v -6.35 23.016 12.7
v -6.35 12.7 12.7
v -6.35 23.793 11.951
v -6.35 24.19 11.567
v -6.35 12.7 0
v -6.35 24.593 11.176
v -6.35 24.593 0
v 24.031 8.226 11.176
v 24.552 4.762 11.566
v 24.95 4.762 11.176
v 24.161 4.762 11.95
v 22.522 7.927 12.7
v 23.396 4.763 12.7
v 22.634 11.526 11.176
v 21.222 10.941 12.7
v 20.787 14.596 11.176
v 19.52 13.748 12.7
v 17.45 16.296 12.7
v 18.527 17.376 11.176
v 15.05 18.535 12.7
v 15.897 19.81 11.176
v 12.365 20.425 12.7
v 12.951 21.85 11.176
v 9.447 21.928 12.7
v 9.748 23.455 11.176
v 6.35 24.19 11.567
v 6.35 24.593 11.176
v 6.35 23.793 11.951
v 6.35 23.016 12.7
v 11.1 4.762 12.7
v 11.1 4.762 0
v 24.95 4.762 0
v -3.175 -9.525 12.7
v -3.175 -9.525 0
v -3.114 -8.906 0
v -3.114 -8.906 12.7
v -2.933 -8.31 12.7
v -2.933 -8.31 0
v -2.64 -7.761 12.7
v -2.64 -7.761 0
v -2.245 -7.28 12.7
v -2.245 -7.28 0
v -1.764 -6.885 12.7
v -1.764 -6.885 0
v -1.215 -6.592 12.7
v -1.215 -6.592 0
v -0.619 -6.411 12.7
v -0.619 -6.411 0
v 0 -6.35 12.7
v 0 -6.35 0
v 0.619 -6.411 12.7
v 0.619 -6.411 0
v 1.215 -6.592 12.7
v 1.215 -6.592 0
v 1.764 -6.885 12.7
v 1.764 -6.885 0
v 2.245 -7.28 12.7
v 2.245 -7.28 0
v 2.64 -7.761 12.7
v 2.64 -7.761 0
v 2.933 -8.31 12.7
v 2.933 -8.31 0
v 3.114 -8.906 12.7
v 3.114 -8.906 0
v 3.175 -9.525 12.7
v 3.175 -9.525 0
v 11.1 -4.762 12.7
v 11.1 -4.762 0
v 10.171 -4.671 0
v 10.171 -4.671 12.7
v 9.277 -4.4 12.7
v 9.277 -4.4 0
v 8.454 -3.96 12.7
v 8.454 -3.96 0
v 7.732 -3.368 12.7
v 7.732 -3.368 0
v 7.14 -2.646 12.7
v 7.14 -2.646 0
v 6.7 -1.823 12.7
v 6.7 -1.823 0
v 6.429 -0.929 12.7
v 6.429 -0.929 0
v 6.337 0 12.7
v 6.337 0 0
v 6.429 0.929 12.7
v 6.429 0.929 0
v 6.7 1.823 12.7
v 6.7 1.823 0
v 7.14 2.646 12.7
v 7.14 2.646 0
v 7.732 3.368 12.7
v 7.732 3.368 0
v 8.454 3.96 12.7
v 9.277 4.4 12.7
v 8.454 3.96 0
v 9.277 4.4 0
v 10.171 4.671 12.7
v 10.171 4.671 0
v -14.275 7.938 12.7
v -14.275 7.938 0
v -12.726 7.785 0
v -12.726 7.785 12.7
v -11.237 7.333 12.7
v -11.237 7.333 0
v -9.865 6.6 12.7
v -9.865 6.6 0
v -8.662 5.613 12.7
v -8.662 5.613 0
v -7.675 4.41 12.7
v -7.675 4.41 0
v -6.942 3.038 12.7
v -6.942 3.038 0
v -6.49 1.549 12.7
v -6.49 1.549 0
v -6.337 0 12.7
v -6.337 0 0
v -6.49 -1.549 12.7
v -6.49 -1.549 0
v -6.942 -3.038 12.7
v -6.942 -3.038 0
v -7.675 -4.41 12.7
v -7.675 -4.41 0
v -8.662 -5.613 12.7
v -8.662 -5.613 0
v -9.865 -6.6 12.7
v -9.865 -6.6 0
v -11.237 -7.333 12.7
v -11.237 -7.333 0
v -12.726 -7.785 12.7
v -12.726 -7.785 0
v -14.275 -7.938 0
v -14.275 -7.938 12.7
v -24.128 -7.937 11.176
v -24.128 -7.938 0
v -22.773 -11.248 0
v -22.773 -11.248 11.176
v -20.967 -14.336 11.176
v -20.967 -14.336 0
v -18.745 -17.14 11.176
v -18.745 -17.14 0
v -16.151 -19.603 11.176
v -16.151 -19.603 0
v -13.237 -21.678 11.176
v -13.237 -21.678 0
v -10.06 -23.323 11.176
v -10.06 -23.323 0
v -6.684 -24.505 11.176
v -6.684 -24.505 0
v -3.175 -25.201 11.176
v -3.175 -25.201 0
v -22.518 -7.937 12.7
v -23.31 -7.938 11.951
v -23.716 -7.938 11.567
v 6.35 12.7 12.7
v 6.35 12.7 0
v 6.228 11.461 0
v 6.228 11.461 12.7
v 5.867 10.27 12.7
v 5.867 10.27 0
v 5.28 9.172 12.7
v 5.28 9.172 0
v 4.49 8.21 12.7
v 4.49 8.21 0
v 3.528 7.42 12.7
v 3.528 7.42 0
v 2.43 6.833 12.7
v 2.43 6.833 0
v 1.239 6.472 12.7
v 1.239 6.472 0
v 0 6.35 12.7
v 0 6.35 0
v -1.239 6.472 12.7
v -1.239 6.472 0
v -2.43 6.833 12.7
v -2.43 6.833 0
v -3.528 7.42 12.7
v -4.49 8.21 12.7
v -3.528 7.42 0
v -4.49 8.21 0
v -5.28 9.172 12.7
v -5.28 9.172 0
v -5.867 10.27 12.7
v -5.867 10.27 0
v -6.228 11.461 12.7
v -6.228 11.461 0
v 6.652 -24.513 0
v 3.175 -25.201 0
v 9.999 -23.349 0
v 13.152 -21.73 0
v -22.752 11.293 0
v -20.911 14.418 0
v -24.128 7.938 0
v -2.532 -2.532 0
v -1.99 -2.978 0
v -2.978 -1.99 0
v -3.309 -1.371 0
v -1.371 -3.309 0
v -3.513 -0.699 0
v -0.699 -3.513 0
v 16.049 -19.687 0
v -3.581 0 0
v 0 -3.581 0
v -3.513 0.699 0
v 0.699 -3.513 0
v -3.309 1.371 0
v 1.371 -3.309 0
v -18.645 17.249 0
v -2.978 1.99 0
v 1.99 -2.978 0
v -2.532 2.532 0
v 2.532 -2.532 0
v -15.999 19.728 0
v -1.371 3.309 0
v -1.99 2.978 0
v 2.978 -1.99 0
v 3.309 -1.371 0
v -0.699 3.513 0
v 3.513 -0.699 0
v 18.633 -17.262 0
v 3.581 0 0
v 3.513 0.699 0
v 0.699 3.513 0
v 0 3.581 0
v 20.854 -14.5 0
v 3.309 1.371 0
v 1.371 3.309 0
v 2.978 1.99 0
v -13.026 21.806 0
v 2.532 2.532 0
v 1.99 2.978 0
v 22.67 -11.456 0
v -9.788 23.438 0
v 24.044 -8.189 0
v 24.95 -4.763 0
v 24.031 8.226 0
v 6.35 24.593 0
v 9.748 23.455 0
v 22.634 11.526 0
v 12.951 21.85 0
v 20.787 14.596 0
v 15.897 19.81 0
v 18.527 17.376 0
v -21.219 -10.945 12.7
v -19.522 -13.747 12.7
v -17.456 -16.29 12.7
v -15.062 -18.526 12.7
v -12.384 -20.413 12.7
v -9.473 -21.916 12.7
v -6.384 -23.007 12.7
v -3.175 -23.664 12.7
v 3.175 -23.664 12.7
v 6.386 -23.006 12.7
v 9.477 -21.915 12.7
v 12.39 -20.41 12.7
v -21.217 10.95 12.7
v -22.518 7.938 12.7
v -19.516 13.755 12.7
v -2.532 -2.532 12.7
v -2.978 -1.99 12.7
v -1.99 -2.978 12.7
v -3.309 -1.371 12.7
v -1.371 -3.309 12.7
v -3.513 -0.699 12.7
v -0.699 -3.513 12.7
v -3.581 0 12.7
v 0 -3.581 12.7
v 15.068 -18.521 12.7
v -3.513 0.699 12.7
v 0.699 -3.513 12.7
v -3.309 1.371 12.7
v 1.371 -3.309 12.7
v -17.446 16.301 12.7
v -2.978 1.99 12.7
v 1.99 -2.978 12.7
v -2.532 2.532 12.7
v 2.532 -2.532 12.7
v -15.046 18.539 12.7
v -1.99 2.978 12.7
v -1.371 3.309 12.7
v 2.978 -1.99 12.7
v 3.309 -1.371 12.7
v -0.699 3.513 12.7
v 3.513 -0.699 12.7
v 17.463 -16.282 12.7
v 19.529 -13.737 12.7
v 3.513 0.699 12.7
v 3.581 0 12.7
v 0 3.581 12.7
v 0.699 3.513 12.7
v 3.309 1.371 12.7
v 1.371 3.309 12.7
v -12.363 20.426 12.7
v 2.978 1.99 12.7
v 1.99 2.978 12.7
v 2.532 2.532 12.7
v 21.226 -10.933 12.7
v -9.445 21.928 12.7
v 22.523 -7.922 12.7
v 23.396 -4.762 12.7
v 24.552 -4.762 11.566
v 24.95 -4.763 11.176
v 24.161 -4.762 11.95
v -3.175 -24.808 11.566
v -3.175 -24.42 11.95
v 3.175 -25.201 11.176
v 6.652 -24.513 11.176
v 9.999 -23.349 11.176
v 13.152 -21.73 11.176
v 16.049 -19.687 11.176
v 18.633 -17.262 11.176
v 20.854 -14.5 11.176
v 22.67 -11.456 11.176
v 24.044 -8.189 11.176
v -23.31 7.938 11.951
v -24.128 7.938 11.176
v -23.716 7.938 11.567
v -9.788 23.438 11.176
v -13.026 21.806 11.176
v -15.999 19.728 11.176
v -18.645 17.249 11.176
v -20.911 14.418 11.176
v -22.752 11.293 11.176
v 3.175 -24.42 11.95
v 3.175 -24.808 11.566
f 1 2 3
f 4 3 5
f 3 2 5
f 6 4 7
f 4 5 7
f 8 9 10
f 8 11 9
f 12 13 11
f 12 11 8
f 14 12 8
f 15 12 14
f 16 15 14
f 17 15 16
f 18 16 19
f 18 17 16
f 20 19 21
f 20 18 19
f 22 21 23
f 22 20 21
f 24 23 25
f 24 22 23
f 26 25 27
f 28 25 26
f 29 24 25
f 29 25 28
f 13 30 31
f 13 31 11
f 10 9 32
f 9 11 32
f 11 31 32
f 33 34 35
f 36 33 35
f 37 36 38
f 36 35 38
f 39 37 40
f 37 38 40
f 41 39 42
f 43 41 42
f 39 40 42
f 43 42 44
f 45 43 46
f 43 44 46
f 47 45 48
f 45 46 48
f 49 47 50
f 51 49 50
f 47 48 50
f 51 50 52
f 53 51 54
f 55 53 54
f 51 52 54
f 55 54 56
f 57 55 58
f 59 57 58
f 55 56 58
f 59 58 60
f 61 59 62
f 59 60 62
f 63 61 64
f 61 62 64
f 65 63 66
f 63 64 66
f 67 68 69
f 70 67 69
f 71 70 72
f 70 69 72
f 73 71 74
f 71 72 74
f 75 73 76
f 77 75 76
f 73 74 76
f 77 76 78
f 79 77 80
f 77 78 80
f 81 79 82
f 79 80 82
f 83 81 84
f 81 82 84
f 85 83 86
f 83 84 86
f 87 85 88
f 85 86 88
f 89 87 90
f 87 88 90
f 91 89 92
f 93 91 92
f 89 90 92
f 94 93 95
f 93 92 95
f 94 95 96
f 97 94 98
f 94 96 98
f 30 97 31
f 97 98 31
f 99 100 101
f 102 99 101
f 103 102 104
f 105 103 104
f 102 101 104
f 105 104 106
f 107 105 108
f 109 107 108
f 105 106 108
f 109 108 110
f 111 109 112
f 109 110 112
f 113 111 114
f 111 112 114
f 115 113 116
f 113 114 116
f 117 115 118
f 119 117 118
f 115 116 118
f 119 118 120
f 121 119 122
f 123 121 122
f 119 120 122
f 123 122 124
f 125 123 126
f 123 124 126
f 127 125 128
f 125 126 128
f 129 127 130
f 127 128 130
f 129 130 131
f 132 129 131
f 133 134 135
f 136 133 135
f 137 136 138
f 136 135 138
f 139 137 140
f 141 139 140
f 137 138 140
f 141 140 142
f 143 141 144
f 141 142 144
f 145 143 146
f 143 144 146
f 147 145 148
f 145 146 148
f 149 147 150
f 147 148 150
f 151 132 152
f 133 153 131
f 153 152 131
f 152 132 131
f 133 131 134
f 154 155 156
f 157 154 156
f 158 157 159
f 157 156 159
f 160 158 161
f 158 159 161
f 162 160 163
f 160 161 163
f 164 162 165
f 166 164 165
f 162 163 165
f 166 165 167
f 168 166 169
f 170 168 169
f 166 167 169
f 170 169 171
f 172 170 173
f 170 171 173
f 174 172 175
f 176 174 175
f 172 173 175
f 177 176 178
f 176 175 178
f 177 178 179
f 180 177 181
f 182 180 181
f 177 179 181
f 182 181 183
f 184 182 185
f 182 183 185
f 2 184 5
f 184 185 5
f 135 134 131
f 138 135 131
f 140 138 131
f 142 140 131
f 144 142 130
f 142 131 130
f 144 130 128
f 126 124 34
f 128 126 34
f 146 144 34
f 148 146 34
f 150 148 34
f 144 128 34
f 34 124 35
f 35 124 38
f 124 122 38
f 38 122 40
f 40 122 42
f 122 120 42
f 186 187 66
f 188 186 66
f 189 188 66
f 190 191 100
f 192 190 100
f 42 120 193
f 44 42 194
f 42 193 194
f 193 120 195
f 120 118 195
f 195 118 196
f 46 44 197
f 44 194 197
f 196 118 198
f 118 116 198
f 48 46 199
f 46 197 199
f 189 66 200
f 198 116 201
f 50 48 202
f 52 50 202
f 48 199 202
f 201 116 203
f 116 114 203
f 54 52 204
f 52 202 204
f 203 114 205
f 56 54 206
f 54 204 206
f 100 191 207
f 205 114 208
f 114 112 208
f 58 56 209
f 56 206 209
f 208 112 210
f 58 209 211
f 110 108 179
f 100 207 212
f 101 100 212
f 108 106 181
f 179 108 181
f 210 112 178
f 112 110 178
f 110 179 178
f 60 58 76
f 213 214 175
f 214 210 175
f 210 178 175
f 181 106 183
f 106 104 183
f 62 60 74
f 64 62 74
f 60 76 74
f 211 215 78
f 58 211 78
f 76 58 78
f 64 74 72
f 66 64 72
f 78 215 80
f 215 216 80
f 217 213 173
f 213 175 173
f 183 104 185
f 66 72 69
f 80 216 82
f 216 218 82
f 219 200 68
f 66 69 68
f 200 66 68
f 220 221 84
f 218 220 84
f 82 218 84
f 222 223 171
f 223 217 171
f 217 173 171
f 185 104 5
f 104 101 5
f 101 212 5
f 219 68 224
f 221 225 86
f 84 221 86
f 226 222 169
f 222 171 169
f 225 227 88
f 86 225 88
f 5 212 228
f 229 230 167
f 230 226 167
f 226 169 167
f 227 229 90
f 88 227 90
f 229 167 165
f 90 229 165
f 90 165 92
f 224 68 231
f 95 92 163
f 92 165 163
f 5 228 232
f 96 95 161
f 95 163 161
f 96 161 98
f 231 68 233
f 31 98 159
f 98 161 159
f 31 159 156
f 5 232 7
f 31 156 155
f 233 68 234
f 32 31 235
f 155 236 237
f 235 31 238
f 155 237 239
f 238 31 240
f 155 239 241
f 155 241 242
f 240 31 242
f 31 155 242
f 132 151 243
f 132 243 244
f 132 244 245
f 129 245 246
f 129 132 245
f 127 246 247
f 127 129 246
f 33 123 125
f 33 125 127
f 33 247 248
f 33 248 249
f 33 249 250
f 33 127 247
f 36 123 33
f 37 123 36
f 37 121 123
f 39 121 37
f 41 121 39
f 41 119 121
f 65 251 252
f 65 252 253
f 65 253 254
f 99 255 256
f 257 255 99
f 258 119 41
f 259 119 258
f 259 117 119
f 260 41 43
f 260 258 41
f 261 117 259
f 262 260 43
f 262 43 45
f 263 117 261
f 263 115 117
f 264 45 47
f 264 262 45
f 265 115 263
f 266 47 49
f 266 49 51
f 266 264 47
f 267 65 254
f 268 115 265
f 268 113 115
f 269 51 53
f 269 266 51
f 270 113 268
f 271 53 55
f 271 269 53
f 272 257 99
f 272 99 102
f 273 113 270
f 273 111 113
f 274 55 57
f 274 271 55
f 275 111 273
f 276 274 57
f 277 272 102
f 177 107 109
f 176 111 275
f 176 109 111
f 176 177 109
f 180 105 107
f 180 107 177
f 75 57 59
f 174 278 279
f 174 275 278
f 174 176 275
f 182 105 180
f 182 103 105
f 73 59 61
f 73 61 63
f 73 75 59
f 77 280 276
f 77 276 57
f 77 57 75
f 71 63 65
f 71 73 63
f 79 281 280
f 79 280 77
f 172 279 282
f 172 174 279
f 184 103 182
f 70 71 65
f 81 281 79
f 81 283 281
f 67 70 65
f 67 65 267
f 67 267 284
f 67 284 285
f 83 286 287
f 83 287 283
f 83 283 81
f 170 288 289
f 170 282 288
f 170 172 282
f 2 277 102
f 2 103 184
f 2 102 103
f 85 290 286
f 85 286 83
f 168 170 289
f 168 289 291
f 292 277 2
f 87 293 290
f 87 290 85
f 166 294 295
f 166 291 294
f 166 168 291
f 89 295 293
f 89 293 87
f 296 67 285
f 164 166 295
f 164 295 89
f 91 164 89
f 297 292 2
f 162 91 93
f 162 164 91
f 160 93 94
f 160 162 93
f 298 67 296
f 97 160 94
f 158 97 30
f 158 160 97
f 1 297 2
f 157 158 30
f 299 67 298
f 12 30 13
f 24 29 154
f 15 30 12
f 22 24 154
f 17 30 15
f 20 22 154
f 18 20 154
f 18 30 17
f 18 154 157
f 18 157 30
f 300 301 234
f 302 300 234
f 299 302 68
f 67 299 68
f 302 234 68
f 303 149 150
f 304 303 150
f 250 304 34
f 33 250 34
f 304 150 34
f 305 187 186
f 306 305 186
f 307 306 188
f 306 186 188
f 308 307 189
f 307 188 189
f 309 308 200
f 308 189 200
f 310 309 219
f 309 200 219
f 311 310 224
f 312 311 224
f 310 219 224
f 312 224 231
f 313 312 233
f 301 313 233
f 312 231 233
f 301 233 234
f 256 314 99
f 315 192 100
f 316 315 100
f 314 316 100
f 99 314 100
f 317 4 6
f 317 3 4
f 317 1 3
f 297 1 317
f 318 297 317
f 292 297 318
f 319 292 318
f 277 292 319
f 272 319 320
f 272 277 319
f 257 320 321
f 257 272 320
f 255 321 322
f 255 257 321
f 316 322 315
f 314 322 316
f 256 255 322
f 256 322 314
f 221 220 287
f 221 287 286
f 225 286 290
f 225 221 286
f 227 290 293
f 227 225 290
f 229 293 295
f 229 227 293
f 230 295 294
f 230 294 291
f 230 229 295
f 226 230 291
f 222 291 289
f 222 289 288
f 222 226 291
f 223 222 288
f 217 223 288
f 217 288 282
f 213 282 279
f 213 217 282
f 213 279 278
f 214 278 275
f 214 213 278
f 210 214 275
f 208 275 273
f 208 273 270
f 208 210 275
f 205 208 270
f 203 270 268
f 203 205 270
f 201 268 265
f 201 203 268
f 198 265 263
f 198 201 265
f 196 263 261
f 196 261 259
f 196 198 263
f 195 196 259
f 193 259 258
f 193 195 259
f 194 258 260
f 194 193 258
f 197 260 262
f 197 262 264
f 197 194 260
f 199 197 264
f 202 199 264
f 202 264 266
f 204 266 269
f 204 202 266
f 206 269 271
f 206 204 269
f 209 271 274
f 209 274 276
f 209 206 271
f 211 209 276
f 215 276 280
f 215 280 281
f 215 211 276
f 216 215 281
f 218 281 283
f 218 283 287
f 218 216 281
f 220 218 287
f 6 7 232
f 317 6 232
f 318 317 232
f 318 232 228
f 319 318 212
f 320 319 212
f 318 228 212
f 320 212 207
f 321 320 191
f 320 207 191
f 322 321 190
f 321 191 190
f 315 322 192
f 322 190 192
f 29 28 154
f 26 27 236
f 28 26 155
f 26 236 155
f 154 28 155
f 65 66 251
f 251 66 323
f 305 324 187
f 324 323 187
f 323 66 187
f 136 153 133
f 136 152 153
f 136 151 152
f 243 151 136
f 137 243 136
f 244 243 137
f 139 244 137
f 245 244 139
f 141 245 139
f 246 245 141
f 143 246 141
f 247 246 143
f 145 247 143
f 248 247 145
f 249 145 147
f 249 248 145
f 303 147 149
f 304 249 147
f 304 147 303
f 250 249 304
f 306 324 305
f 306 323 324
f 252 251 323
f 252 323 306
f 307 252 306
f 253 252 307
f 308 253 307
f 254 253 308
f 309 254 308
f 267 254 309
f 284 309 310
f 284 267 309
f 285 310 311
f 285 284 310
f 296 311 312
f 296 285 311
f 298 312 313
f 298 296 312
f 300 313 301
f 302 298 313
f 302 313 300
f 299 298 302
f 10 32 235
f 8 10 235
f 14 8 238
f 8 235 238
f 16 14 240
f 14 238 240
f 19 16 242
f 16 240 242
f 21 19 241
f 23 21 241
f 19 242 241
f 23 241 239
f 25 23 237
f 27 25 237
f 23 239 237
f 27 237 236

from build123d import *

# Parameters (mm, degrees)
F0_R     = 3.5814
F1_DEPTH = 12.7
F2_SIZE2 = 1.524
F2_SIZE  = 1.524


with BuildPart() as f1:
    # F0 (on Top) → F1 (new body)
    with BuildSketch(Plane.XY):
        with BuildLine():
            Line((-14.2748, -7.9375), (-24.127911, -7.9375))
            ThreePointArc((-24.127911, -7.9375), (-16.151392, -19.603381), (-3.175, -25.200781))
            Line((-3.175, -25.200781), (-3.175, -9.525))
            ThreePointArc((-3.175, -9.525), (0, -6.35), (3.175, -9.525))
            Line((3.175, -9.525), (3.175, -25.200781))
            ThreePointArc((3.175, -25.200781), (17.383268, -18.519773), (24.949521, -4.7625))
            Line((24.949521, -4.7625), (11.0998, -4.7625))
            ThreePointArc((11.0998, -4.7625), (6.3373, 0), (11.0998, 4.7625))
            Line((11.0998, 4.7625), (24.949521, 4.7625))
            ThreePointArc((24.949521, 4.7625), (18.52651, 17.376087), (6.35, 24.593444))
            Line((6.35, 24.593444), (6.35, 12.7))
            ThreePointArc((6.35, 12.7), (0, 6.35), (-6.35, 12.7))
            Line((-6.35, 12.7), (-6.35, 24.593444))
            ThreePointArc((-6.35, 24.593444), (-17.366084, 18.535887), (-24.127911, 7.9375))
            Line((-24.127911, 7.9375), (-14.2748, 7.9375))
            ThreePointArc((-14.2748, 7.9375), (-6.3373, 0), (-14.2748, -7.9375))
        make_face()
        Circle(F0_R, mode=Mode.SUBTRACT)
    extrude(amount=F1_DEPTH)

    # F2
    f2_edges = [f1.edges().sort_by_distance(p)[0] for p in [
        (-17.366084, 18.535887, 12.7),
        (18.52651, 17.376087, 12.7),
        (17.383268, -18.519773, 12.7),
        (-16.151392, -19.603381, 12.7),
    ]]
    chamfer(f2_edges, length=F2_SIZE, length2=F2_SIZE2)


solid = f1.part
